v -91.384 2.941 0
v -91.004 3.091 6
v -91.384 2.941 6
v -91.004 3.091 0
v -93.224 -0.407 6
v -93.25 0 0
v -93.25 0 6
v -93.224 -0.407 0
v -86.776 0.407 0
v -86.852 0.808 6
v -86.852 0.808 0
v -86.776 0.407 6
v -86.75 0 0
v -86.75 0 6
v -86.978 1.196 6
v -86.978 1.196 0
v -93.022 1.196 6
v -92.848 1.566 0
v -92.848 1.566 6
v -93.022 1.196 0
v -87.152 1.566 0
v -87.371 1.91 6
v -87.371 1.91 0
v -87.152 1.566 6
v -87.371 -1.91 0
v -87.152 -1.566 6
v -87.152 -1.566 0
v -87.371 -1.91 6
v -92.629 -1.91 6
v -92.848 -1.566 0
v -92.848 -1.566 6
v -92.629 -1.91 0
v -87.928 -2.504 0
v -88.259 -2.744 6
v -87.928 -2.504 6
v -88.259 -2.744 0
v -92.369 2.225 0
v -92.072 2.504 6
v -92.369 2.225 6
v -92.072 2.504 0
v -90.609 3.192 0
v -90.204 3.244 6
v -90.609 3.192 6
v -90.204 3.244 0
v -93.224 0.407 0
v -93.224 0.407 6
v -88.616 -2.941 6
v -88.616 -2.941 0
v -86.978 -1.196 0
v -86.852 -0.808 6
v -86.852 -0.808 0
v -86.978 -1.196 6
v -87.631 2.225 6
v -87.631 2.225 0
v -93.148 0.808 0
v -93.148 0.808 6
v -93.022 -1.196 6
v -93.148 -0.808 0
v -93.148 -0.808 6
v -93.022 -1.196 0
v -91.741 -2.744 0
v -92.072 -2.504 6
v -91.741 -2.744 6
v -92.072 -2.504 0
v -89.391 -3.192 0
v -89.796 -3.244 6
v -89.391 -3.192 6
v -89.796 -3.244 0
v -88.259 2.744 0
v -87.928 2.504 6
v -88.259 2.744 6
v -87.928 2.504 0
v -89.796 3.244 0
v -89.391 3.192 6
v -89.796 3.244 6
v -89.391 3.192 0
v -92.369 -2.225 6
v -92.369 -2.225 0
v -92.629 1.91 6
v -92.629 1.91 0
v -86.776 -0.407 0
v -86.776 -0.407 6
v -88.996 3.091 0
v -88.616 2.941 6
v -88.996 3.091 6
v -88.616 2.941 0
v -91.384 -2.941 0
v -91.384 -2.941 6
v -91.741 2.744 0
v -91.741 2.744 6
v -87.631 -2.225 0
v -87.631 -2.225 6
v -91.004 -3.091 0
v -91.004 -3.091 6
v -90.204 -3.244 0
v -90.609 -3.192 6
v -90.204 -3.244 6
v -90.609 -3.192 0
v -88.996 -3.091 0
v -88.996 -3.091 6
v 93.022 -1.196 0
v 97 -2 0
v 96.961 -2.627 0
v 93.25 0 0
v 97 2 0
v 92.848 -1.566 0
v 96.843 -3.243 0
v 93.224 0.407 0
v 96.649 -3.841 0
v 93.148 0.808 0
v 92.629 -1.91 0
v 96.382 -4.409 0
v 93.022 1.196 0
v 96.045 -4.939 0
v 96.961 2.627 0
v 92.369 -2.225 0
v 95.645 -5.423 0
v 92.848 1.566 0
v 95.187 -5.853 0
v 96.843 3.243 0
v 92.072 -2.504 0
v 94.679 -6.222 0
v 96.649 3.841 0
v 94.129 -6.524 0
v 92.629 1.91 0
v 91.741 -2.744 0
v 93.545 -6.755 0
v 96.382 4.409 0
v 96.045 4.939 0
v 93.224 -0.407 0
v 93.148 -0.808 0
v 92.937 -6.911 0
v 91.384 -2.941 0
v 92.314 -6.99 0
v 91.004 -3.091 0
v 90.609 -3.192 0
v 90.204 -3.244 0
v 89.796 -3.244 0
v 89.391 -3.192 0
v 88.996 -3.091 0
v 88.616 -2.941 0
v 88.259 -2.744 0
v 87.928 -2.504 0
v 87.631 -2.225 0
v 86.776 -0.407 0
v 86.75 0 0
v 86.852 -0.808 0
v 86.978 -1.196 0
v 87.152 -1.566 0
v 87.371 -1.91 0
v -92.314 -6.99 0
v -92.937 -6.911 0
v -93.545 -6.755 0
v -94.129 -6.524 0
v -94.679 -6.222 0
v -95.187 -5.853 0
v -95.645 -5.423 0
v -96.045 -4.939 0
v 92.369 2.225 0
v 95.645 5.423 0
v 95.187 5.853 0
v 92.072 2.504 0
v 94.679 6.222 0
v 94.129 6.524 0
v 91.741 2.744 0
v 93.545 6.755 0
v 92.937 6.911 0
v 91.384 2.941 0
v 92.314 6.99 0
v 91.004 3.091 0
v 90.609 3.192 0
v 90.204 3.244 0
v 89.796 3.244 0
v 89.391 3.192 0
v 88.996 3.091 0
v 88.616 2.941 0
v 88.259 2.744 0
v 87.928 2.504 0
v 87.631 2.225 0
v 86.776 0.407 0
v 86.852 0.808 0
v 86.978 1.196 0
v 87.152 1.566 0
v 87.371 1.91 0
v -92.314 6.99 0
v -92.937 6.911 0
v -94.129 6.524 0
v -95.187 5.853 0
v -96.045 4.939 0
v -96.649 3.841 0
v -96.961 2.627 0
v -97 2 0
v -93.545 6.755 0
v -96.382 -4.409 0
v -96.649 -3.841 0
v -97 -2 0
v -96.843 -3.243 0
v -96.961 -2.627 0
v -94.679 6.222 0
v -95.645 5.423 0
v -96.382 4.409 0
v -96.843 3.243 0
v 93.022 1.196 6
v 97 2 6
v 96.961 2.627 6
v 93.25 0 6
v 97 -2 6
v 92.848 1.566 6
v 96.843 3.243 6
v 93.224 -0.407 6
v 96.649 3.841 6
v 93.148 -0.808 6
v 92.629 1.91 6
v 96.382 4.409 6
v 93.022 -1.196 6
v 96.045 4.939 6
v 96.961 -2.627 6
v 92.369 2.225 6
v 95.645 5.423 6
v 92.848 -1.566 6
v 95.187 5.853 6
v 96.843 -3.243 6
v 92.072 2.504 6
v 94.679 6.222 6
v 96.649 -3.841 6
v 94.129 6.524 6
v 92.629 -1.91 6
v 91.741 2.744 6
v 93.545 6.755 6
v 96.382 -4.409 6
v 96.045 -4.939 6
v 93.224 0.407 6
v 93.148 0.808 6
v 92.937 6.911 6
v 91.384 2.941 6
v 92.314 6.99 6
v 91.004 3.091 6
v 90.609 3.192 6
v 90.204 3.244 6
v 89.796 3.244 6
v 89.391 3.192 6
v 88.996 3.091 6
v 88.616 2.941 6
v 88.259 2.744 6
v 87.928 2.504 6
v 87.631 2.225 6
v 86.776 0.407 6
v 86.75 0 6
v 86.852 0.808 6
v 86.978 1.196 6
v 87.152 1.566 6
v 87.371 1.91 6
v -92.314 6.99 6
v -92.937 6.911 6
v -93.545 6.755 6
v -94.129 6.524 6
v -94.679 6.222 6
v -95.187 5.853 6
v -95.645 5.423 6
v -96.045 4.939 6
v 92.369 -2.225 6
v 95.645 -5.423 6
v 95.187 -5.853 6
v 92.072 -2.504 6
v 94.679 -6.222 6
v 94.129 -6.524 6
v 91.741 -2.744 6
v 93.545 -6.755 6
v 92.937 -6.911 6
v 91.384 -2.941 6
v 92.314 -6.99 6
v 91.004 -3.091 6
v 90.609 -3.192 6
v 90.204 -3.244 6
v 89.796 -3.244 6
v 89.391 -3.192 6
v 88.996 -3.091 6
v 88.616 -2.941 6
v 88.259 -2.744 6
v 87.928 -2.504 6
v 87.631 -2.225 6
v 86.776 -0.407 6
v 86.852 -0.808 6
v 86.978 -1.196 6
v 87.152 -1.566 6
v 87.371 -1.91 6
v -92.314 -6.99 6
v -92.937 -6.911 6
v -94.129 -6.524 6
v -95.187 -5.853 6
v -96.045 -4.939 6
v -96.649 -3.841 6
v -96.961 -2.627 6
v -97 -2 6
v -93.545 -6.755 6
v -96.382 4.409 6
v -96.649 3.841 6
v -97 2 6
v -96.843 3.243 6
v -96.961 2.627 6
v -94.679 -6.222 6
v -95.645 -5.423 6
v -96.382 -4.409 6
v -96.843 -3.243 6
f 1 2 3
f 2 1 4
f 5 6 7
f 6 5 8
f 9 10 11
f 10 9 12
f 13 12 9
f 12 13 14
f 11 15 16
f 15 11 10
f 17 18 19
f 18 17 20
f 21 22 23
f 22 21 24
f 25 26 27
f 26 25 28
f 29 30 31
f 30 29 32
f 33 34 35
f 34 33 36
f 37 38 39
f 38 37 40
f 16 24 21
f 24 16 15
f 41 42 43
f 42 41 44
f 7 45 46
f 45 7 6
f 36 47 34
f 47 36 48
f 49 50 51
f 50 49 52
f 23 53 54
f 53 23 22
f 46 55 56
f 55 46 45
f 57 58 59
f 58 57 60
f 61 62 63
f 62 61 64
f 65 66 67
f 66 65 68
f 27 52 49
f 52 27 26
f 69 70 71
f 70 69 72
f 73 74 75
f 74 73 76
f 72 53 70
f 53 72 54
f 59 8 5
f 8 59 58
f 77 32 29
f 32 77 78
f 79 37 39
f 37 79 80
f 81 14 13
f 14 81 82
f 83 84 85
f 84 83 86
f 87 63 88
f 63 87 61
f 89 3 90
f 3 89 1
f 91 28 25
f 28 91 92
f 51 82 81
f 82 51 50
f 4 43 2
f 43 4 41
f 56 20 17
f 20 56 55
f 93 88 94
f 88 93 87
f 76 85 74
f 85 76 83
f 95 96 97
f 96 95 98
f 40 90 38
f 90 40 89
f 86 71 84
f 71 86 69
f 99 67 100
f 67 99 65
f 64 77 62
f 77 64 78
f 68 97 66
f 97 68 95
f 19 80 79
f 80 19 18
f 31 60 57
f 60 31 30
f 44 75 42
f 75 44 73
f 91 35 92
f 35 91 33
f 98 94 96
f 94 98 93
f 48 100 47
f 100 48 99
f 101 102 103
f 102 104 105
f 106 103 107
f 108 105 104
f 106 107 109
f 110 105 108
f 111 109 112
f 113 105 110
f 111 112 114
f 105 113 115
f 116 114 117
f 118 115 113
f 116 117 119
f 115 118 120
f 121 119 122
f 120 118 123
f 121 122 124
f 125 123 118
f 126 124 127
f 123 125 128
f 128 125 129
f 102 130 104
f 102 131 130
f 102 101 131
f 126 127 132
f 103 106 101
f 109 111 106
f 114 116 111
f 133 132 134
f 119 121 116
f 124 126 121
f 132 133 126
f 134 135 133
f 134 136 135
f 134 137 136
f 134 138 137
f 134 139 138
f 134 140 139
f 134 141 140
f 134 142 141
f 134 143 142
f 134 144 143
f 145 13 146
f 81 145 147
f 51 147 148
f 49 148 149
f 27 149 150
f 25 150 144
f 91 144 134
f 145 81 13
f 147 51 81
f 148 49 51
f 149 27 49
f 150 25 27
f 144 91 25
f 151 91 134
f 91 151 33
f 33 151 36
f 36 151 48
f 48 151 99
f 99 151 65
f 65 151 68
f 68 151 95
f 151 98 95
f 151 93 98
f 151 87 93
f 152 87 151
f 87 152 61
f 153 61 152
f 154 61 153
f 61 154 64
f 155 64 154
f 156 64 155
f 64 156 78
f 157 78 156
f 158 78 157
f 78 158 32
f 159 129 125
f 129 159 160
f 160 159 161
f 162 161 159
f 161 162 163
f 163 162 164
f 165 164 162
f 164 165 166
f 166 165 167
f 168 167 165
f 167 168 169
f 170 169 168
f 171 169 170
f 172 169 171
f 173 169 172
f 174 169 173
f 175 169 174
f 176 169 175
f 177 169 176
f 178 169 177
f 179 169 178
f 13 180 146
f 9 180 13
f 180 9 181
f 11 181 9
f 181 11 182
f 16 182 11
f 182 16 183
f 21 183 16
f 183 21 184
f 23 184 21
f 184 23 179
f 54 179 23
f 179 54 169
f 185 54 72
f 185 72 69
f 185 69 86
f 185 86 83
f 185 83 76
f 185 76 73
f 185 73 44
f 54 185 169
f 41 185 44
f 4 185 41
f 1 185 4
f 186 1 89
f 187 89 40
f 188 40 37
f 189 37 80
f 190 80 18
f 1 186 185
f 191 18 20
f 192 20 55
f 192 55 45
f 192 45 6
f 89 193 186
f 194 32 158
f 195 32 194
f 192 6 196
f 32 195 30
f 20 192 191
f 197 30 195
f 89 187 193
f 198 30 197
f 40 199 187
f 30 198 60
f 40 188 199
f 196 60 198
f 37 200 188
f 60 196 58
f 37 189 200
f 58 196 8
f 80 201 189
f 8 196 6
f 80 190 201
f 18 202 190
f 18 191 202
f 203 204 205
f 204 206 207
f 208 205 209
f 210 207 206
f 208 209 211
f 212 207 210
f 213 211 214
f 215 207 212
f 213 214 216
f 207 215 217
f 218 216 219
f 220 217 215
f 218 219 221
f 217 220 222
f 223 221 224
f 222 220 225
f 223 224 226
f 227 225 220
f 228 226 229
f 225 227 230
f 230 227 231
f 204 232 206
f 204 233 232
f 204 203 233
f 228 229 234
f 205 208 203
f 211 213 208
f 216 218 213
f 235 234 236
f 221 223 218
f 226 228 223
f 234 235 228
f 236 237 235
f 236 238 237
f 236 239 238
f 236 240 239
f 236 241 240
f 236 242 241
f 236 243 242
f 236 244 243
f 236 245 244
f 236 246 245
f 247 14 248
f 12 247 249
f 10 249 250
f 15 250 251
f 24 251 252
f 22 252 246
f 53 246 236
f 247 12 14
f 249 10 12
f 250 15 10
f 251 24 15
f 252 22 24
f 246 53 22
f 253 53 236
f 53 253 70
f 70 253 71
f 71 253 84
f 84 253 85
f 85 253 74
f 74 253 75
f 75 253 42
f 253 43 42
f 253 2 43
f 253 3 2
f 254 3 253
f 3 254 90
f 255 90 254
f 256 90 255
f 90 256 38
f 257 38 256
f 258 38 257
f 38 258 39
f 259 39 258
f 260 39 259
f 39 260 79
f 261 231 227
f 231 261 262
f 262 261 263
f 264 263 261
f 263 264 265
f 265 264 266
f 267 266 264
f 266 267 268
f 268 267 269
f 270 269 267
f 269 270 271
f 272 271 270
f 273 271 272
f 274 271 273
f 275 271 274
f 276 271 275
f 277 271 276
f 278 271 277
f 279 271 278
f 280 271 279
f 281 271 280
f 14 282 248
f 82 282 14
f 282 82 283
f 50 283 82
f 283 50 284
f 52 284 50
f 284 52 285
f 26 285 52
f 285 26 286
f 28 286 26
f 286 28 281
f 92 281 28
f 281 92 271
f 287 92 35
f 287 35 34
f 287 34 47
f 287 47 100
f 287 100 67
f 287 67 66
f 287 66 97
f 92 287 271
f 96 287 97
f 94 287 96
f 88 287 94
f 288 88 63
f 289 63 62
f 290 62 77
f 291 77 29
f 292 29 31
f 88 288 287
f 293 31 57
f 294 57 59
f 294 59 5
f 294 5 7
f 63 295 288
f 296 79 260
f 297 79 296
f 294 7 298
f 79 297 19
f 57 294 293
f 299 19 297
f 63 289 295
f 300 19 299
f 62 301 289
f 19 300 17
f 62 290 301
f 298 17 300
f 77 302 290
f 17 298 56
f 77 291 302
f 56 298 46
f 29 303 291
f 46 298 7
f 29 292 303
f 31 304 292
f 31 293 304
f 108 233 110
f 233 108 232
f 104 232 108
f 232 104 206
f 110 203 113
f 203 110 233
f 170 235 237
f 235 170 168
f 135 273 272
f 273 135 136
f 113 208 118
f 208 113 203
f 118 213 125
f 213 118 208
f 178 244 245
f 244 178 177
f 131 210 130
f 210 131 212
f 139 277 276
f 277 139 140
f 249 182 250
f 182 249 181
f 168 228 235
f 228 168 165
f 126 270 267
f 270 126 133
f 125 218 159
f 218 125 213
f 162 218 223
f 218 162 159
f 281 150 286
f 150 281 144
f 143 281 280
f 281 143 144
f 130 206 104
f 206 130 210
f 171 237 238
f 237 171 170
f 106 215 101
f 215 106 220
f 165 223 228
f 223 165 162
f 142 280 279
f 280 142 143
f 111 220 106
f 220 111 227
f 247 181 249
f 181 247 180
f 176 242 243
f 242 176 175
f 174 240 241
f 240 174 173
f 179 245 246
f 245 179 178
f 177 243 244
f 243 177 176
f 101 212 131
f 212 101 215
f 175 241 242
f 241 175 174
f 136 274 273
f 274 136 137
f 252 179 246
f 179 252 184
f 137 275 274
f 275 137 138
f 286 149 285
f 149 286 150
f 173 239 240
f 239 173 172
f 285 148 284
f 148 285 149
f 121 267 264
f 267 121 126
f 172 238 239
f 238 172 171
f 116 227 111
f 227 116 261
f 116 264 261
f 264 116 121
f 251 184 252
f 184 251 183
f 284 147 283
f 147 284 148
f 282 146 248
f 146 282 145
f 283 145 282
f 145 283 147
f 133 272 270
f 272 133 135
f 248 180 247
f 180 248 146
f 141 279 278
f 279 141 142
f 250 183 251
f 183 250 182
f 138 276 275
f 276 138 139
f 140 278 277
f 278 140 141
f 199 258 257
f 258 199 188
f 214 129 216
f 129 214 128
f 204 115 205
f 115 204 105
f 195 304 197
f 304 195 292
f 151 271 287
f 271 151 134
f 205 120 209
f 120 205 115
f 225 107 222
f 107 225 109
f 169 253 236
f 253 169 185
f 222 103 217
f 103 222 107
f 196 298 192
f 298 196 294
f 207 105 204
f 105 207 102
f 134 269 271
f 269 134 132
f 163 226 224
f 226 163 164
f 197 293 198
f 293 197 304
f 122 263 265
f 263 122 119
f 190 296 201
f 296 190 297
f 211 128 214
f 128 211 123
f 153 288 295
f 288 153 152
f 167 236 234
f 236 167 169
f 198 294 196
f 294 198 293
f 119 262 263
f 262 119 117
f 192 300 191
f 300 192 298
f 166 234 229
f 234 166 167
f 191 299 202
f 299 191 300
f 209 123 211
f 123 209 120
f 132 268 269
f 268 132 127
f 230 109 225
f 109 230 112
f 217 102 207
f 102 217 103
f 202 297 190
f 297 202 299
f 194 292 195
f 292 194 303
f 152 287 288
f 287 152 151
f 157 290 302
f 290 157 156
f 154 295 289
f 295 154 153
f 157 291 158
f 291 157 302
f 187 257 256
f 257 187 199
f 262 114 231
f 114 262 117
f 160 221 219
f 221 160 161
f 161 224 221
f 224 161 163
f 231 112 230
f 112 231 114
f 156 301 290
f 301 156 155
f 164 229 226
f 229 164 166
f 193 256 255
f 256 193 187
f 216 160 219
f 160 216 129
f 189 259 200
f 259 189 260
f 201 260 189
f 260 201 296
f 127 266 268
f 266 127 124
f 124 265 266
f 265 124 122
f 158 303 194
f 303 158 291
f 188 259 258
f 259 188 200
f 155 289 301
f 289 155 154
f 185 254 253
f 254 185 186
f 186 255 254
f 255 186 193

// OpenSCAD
$fn = 50;


difference() {
	union() {
		hull() {
			translate(v = [-92.0000000000, 2.0000000000, 0]) {
				cylinder(h = 6, r = 5);
			}
			translate(v = [92.0000000000, 2.0000000000, 0]) {
				cylinder(h = 6, r = 5);
			}
			translate(v = [-92.0000000000, -2.0000000000, 0]) {
				cylinder(h = 6, r = 5);
			}
			translate(v = [92.0000000000, -2.0000000000, 0]) {
				cylinder(h = 6, r = 5);
			}
		}
	}
	union() {
		translate(v = [-90.0000000000, 0.0000000000, 0]) {
			cylinder(h = 6, r = 3.2500000000);
		}
		translate(v = [90.0000000000, 0.0000000000, 0]) {
			cylinder(h = 6, r = 3.2500000000);
		}
		translate(v = [-90.0000000000, 0.0000000000, 0]) {
			cylinder(h = 6, r = 1.8000000000);
		}
		translate(v = [90.0000000000, 0.0000000000, 0]) {
			cylinder(h = 6, r = 1.8000000000);
		}
		translate(v = [-90.0000000000, 0.0000000000, 0]) {
			cylinder(h = 6, r = 1.8000000000);
		}
		translate(v = [90.0000000000, 0.0000000000, 0]) {
			cylinder(h = 6, r = 1.8000000000);
		}
		translate(v = [-90.0000000000, 0.0000000000, 0]) {
			cylinder(h = 6, r = 1.8000000000);
		}
		translate(v = [90.0000000000, 0.0000000000, 0]) {
			cylinder(h = 6, r = 1.8000000000);
		}
	}
}
